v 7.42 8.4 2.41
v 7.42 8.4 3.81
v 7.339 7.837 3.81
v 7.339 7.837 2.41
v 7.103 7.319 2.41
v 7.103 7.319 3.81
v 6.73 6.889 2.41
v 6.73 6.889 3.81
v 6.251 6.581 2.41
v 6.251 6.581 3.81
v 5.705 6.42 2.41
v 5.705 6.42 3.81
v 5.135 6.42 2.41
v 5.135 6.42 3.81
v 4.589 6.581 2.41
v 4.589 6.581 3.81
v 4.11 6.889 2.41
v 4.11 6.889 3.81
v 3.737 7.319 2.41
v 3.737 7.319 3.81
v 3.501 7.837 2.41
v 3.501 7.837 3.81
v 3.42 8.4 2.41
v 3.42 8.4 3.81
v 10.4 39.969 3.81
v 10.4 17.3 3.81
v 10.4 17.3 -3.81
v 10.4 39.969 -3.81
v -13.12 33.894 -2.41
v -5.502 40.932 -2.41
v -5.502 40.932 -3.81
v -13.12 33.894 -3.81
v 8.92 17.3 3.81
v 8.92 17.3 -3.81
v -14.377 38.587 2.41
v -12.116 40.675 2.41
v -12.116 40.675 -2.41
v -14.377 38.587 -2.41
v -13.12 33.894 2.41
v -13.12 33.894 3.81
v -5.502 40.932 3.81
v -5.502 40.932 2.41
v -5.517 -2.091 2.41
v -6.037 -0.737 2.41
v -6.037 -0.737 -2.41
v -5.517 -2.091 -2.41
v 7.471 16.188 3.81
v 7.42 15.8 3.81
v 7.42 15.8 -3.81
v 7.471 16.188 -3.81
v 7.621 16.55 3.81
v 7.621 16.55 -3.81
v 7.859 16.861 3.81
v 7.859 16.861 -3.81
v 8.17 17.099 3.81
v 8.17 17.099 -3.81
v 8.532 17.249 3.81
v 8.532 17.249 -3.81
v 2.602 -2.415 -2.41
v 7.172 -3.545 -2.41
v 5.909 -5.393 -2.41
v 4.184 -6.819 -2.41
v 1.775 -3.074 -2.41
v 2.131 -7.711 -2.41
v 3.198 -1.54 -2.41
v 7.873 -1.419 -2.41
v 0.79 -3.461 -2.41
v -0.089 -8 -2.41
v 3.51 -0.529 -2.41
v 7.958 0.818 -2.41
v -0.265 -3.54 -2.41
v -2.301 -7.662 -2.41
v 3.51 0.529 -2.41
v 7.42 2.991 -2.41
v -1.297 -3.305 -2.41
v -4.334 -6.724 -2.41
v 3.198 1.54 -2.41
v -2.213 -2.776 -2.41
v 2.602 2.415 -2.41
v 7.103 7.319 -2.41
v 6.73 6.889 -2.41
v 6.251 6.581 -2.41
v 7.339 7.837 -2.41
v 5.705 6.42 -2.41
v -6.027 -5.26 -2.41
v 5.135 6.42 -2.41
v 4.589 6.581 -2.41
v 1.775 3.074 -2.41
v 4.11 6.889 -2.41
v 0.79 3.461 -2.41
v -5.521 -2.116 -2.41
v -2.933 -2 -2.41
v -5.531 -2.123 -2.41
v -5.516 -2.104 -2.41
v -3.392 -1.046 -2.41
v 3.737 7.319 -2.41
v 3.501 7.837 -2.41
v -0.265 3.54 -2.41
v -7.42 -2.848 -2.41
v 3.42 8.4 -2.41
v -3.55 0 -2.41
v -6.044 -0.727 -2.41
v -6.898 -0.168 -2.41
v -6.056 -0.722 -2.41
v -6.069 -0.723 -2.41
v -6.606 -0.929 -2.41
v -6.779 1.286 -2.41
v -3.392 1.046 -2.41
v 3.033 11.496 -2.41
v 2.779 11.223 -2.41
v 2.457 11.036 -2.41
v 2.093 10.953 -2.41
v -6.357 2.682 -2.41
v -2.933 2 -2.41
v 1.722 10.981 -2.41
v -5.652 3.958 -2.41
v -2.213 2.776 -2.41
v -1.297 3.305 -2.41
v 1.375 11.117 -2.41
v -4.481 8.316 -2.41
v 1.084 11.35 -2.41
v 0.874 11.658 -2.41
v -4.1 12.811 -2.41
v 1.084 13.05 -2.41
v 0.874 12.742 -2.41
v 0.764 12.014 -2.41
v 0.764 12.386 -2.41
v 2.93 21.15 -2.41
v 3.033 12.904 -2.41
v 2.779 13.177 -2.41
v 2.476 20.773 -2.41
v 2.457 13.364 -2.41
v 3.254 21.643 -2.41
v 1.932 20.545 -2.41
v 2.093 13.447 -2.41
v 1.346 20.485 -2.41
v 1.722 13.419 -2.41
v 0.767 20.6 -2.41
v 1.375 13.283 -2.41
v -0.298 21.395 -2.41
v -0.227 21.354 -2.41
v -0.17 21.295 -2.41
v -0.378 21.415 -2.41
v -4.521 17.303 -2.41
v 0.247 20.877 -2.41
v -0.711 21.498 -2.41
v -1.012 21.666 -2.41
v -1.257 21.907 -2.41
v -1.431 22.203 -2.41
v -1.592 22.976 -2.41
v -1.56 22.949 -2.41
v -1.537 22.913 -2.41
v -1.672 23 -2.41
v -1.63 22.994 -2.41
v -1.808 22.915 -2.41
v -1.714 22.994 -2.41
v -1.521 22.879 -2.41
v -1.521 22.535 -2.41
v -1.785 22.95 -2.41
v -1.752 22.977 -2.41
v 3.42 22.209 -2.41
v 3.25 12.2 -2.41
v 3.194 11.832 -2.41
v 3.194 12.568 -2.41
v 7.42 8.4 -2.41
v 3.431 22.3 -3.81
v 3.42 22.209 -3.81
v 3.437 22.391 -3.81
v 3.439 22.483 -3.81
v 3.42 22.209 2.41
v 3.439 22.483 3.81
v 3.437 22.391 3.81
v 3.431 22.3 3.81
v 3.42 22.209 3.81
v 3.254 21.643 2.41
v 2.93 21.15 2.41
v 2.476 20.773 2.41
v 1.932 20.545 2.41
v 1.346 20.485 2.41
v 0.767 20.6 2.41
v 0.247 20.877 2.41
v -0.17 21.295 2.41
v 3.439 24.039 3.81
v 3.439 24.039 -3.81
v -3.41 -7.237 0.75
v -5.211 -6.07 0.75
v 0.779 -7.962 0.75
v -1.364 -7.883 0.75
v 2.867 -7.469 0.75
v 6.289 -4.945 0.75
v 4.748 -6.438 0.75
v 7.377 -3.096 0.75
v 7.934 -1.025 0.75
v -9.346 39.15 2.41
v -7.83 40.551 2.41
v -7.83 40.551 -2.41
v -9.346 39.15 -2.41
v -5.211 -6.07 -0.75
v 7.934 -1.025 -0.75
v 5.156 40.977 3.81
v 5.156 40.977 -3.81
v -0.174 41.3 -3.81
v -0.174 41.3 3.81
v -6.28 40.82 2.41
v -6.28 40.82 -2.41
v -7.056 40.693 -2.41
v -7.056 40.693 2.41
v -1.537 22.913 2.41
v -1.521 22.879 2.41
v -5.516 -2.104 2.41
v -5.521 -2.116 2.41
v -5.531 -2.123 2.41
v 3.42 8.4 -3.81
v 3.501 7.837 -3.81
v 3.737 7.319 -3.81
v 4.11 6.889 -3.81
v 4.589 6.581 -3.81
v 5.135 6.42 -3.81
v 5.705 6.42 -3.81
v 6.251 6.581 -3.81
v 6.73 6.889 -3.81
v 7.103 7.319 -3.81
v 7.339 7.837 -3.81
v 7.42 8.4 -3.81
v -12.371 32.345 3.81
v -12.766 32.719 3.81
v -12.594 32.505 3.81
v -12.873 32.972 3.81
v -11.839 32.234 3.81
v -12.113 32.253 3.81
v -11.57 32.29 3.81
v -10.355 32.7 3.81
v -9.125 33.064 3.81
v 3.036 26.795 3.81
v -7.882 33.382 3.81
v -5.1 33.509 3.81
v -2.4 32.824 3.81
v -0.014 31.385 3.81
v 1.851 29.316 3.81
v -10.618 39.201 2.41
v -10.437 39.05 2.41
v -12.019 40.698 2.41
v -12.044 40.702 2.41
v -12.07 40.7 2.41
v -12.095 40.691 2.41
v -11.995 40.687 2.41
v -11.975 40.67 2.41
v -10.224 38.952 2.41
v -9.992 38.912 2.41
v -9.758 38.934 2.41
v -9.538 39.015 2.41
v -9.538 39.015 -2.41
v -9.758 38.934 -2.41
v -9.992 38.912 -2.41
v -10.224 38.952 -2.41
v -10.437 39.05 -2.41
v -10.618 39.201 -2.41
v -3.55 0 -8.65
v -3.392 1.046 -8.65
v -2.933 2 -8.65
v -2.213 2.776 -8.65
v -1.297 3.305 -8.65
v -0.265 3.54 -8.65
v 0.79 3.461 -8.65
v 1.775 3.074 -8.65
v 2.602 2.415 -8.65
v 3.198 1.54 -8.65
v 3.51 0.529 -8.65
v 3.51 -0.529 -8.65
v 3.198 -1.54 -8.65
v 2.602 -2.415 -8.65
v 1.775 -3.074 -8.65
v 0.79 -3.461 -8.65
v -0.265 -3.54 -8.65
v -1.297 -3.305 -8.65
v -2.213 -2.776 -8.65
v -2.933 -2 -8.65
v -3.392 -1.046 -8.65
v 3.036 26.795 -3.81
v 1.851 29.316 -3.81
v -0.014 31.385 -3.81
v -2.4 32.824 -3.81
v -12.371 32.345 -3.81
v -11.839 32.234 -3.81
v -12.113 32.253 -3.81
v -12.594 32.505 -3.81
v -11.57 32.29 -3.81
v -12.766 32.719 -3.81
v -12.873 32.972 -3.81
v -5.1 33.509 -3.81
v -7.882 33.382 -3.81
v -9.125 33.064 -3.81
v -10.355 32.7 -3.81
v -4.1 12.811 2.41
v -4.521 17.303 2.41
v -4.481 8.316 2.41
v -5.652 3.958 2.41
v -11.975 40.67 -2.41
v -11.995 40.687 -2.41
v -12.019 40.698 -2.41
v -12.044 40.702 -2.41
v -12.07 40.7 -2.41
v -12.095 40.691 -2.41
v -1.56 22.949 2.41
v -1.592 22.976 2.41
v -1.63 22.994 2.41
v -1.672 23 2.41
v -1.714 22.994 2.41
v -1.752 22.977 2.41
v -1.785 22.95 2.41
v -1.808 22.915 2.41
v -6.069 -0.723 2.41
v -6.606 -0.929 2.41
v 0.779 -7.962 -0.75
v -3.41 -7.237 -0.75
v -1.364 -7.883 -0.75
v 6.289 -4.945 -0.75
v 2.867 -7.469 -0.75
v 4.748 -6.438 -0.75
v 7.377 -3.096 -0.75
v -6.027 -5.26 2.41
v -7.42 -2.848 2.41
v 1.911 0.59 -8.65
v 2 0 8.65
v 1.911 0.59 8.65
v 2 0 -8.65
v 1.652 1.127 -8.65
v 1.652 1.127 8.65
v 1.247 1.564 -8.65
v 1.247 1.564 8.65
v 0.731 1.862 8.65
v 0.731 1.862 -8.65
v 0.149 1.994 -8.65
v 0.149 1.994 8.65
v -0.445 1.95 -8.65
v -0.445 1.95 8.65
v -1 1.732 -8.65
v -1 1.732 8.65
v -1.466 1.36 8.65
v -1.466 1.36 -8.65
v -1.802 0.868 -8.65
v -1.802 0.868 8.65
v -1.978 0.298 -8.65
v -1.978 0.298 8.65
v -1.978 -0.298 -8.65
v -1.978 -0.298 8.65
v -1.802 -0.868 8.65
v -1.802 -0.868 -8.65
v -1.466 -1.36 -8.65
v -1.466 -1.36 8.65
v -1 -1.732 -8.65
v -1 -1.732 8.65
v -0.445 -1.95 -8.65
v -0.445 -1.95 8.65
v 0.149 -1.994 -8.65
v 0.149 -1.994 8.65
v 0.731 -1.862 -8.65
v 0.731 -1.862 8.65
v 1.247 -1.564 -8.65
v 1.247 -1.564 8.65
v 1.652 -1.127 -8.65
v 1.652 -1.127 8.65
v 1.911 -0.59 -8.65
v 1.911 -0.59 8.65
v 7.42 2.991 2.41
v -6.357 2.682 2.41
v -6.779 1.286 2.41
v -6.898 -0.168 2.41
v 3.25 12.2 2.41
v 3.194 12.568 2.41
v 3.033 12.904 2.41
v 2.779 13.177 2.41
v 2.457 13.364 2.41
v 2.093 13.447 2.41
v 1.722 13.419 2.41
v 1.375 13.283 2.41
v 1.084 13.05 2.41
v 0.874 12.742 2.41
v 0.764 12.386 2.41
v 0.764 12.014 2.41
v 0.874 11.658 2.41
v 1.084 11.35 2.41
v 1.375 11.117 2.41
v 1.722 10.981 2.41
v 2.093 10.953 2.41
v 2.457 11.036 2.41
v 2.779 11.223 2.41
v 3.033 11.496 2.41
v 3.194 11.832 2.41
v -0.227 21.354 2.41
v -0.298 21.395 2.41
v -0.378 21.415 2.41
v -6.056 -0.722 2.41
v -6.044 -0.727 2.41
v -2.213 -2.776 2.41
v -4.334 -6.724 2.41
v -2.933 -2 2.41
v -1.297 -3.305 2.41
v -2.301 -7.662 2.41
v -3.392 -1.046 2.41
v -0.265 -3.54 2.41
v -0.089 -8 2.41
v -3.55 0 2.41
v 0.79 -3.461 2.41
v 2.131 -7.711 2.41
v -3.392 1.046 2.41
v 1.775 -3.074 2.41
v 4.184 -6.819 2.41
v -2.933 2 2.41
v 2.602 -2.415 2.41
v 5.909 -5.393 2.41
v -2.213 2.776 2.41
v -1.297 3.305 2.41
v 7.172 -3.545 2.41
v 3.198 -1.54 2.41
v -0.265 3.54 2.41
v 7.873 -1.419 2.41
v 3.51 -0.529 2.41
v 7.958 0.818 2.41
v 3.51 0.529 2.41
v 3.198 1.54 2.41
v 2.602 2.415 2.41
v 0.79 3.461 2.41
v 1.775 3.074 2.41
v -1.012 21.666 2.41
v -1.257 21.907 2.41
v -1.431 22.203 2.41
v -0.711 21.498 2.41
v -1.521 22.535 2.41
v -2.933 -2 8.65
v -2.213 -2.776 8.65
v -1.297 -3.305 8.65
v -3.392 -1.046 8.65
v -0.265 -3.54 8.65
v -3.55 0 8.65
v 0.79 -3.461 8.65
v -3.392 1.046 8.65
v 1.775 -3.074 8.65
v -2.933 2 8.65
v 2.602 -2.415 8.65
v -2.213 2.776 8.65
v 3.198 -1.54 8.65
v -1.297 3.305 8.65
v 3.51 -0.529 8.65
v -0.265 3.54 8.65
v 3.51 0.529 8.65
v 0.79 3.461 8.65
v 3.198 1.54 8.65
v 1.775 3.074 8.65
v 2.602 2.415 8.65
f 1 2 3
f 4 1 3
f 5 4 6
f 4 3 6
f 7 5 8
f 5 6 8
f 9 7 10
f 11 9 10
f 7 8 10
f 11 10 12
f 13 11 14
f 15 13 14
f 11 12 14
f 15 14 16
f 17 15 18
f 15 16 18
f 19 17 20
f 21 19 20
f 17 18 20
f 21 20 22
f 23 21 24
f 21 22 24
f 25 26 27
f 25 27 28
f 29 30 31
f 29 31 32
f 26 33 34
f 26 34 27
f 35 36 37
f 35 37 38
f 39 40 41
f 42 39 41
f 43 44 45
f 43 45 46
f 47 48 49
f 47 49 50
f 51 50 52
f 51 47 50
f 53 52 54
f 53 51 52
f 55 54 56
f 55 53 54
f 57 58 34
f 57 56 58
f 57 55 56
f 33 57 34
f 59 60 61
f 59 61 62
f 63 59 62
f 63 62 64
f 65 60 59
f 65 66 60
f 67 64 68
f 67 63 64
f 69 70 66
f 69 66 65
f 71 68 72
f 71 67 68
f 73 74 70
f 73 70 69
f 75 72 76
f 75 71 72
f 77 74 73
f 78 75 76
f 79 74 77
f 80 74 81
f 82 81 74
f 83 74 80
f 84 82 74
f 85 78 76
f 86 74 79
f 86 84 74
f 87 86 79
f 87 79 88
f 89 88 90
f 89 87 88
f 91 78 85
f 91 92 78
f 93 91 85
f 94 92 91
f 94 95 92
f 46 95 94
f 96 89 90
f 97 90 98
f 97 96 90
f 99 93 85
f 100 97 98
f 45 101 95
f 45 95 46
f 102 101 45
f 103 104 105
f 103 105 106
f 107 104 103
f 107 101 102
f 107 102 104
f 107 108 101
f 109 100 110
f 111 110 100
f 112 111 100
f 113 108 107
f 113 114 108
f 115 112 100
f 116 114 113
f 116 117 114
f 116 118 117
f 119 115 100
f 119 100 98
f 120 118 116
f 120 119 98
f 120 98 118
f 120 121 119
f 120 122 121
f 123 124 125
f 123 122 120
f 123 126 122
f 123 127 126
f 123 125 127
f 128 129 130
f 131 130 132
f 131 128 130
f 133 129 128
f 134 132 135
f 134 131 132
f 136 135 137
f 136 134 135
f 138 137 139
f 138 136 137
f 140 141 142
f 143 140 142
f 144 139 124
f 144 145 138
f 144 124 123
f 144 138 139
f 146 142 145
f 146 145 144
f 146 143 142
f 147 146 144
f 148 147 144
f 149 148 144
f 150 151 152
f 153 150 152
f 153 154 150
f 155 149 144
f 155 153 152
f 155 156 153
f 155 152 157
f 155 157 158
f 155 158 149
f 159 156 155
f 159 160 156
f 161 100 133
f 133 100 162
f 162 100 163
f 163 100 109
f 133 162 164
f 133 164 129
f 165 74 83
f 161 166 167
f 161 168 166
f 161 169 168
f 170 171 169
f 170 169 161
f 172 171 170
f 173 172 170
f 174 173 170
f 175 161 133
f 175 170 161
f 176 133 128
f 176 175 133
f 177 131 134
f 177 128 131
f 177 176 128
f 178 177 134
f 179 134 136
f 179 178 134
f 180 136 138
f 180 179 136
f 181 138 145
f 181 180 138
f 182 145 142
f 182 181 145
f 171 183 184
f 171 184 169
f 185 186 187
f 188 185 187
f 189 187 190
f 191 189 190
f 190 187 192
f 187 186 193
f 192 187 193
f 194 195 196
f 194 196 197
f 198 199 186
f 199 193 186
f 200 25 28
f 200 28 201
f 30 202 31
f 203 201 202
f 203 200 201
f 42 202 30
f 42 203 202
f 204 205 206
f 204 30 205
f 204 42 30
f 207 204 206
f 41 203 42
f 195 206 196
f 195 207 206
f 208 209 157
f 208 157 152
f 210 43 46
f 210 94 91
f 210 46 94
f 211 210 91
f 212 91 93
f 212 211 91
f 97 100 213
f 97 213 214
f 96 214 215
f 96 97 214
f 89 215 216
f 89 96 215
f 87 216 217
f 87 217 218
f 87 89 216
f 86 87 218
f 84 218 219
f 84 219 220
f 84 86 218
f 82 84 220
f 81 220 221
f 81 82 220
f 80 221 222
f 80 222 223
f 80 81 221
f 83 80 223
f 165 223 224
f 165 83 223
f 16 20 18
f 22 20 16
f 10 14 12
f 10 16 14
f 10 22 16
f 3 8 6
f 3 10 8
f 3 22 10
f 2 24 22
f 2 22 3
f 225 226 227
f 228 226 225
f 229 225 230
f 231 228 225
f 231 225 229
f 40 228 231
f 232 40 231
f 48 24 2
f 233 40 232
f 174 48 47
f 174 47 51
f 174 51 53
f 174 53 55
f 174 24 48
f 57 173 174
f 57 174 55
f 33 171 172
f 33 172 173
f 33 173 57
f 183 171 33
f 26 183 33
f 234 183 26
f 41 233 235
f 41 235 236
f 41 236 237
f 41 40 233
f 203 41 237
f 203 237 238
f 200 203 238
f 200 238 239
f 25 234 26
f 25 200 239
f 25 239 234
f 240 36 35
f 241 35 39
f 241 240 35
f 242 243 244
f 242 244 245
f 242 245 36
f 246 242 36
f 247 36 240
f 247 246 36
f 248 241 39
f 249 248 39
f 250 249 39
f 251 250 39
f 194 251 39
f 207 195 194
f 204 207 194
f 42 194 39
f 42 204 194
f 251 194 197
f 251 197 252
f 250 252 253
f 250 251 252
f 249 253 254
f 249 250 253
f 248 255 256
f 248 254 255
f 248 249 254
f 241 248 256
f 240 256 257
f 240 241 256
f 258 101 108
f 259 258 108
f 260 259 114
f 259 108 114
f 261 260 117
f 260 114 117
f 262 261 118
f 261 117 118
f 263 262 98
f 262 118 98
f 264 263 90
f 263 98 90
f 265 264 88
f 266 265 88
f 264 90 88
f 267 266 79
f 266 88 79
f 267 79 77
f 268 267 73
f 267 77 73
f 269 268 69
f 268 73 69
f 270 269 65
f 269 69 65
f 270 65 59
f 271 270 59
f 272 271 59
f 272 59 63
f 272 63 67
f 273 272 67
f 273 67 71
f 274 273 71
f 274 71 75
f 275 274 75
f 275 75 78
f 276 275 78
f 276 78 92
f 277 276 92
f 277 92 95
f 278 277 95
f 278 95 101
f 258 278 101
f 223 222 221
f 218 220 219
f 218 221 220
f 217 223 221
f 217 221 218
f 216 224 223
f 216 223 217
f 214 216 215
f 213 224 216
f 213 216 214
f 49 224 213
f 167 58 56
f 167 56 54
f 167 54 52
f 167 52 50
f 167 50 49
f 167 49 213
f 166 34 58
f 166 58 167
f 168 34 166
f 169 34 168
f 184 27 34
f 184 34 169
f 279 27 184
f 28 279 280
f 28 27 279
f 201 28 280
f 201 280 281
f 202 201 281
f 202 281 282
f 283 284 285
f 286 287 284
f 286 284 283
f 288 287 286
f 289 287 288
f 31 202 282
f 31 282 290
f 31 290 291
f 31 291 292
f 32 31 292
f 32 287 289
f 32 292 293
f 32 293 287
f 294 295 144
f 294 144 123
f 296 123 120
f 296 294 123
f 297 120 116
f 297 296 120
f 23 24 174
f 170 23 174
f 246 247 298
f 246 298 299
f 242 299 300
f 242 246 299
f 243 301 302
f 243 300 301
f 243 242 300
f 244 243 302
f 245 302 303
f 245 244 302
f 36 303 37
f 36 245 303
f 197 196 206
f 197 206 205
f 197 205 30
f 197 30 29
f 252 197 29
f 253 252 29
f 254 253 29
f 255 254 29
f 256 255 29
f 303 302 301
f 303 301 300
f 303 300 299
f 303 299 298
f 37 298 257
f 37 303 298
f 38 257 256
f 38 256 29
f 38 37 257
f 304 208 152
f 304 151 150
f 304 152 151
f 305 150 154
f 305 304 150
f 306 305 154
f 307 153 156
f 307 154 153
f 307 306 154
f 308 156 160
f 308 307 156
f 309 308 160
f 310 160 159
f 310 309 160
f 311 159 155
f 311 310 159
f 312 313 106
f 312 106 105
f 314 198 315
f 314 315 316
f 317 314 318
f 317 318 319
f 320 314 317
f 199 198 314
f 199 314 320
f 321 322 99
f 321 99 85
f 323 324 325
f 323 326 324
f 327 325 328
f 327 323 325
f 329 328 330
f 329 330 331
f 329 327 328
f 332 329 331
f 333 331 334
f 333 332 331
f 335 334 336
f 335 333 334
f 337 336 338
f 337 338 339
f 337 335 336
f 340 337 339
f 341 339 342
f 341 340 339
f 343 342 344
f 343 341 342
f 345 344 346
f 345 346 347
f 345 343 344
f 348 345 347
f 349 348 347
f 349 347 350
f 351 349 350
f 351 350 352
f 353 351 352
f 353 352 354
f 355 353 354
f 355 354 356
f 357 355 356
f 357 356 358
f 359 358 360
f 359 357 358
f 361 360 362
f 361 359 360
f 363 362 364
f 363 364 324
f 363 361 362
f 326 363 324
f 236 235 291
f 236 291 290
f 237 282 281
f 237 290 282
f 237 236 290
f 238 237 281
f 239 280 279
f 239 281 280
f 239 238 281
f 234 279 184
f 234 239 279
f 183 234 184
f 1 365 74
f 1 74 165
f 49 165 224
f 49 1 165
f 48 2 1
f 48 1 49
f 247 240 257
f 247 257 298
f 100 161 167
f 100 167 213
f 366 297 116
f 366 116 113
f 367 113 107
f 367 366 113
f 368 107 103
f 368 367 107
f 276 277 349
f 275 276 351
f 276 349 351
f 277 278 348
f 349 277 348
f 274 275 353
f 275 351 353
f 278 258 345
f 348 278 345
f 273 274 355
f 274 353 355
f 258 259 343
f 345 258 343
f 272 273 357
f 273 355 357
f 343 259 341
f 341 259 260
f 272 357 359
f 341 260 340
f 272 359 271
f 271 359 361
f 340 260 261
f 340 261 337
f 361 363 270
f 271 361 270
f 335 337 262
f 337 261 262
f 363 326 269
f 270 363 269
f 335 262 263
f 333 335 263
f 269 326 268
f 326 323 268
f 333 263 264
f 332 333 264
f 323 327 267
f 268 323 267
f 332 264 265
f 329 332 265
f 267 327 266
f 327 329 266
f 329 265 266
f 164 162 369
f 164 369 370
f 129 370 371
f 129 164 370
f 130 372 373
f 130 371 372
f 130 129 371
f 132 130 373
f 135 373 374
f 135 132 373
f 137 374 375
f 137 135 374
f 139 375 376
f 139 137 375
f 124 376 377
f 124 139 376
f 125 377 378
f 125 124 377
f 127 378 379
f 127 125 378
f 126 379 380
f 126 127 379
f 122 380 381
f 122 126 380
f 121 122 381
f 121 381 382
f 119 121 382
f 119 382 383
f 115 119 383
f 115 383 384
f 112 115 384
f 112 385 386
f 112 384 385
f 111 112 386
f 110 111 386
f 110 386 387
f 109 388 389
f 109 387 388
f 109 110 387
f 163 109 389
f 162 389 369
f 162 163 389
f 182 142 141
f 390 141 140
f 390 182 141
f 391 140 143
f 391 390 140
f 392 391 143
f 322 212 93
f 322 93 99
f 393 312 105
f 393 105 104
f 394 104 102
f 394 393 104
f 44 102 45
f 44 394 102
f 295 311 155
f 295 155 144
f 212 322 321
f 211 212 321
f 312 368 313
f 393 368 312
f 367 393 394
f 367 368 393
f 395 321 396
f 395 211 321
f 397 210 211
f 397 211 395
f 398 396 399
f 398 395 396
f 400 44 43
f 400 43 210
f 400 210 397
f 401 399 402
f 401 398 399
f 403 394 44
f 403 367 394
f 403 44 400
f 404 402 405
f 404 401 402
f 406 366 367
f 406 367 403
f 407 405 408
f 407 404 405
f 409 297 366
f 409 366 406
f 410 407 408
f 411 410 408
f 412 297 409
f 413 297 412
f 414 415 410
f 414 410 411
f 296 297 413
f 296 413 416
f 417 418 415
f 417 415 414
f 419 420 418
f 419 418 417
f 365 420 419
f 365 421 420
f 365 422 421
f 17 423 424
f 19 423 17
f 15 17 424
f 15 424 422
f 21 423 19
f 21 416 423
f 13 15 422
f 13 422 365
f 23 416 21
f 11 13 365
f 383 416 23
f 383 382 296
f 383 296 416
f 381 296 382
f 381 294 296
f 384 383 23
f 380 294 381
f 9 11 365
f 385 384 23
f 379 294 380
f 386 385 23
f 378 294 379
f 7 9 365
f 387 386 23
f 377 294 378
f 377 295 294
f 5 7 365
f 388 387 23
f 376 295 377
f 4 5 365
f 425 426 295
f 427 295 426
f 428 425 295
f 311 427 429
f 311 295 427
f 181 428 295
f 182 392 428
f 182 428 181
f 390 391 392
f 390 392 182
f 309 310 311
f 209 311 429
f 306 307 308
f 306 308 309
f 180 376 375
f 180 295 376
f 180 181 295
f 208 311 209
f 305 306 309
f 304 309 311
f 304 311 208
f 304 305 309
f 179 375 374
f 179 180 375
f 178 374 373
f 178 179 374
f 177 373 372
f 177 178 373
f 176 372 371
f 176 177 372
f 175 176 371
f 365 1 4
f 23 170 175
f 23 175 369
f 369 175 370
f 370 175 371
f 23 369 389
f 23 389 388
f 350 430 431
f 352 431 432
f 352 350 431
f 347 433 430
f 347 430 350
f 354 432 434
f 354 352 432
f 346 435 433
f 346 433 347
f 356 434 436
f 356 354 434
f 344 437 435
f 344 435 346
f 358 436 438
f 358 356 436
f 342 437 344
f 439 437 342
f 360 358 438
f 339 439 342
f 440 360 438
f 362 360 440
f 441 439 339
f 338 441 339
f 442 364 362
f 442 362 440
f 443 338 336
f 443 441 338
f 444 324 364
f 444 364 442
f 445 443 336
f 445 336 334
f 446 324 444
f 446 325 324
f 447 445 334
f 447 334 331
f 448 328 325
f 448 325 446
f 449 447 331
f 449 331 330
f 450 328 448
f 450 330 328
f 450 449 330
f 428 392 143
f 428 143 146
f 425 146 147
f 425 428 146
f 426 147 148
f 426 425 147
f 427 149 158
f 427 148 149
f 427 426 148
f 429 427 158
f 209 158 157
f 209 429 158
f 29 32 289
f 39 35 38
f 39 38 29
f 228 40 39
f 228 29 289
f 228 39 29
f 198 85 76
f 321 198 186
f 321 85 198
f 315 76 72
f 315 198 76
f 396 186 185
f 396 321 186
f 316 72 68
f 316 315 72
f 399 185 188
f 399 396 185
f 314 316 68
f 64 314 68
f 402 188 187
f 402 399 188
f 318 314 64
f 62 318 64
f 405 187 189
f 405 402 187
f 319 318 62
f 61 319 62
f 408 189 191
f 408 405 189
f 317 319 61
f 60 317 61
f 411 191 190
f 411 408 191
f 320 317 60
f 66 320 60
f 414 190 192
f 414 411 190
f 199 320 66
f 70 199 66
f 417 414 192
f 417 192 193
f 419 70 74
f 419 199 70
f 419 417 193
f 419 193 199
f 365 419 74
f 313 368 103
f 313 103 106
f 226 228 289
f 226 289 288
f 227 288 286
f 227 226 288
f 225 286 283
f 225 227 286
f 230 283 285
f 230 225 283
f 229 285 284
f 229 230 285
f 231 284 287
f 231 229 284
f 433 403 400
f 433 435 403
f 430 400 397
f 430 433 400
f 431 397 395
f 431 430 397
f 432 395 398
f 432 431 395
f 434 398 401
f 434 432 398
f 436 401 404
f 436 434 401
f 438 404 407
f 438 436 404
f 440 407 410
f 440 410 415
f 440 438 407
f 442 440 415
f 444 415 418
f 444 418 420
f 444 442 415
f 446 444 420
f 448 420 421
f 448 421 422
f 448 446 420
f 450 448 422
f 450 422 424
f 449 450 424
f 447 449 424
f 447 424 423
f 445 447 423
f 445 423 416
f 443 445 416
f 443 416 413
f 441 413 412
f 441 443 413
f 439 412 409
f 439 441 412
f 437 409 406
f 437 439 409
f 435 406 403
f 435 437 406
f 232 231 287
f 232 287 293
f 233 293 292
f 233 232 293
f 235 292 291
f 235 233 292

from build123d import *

# Parameters (mm, degrees)
SKETCH1_R               = 2
BOSS_EXTRUDE2_DEPTH     = 8.65
CUT_EXTRUDE3_START      = -4.84
SKETCH21_R              = 3.55
CUT_EXTRUDE3_DEPTH      = 4.84
SKETCH18_R              = 3.55
CUT_EXTRUDE4_DEPTH      = 4.84
SKETCH27_R              = 3.55
CUT_EXTRUDE7_DEPTH      = 1.4
CUT_EXTRUDE8_START      = -1.4
SKETCH29_R              = 3.55
CUT_EXTRUDE8_DEPTH      = 1.4
CUT_EXTRUDE9_DEPTH      = 45.578250281
CUT_EXTRUDE9_DEPTH_BACK = 45.578250281
SKETCH6_R               = 1.25
CUT_EXTRUDE10_DEPTH     = 0.75


with BuildPart() as part:
    # Sketch1 → Boss-Extrude2 (new, symmetric)
    with BuildSketch(Plane.XY):
        with BuildLine():
            ThreePointArc((-5.651629818, 3.958418927), (-6.605289058, 1.995032948), (-6.897954559, -0.167996721))
            Line((-6.897954559, -0.167996721), (-6.605824697, -0.929021032))
            Line((-6.605824697, -0.929021032), (-6.069015951, -0.722959461))
            ThreePointArc((-6.069015951, -0.722959461), (-6.049888336, -0.723460336), (-6.036717242, -0.737339773))
            Line((-6.036717242, -0.737339773), (-5.517083715, -2.091031392))
            ThreePointArc((-5.517083715, -2.091031392), (-5.517584589, -2.110159006), (-5.531464027, -2.123330101))
            Line((-5.531464027, -2.123330101), (-7.419958348, -2.848255151))
            Line((-7.419958348, -2.848255151), (-6.027342222, -5.260337036))
            ThreePointArc((-6.027342222, -5.260337036), (4.183814464, -6.818775296), (7.42, 2.990585227))
            Line((7.42, 2.990585227), (7.42, 9.395292614))
            Line((7.42, 9.395292614), (7.42, 15.8))
            ThreePointArc((7.42, 15.8), (7.859339828, 16.860660172), (8.92, 17.3))
            Line((8.92, 17.3), (10.4, 17.3))
            Line((10.4, 17.3), (10.4, 39.969113075))
            ThreePointArc((10.4, 39.969113075), (1.317615366, 41.278976365), (-7.82981649, 40.551004596))
            Line((-7.82981649, 40.551004596), (-9.346087248, 39.150359553))
            ThreePointArc((-9.346087248, 39.150359553), (-9.992424937, 38.912169279), (-10.617880658, 39.200773083))
            Line((-10.617880658, 39.200773083), (-11.974969412, 40.669891905))
            ThreePointArc((-11.974969412, 40.669891905), (-12.044464492, 40.701958995), (-12.116279791, 40.675493408))
            Line((-12.116279791, 40.675493408), (-14.377339743, 38.586854295))
            Line((-14.377339743, 38.586854295), (-12.872946932, 32.972383888))
            ThreePointArc((-12.872946932, 32.972383888), (-12.370989585, 32.345351225), (-11.569711725, 32.289809083))
            ThreePointArc((-11.569711725, 32.289809083), (-9.741406245, 32.887611716), (-7.882463977, 33.38198259))
            ThreePointArc((-7.882463977, 33.38198259), (-0.014271933, 31.38535878), (3.438957848, 24.038920408))
            Line((3.438957848, 24.038920408), (3.438957848, 22.483224896))
            ThreePointArc((3.438957848, 22.483224896), (2.06450625, 20.583569875), (-0.169731349, 21.294898734))
            ThreePointArc((-0.169731349, 21.294898734), (-0.261150212, 21.376524071), (-0.377583309, 21.41477898))
            ThreePointArc((-0.377583309, 21.41477898), (-1.257242701, 21.906570189), (-1.521126803, 22.879208054))
            Line((-1.521126803, 22.879208054), (-1.537067384, 22.913392739))
            ThreePointArc((-1.537067384, 22.913392739), (-1.671971186, 22.999996378), (-1.808065565, 22.91527598))
            Line((-1.808065565, 22.91527598), (-4.520599254, 17.303209571))
            ThreePointArc((-4.520599254, 17.303209571), (-4.190739584, 10.554927226), (-5.651629818, 3.958418927))
        make_face()
        Circle(SKETCH1_R, mode=Mode.SUBTRACT)
    extrude(amount=BOSS_EXTRUDE2_DEPTH, both=True)

    # Sketch21 → Cut-Extrude3 (cut)
    with BuildSketch(Plane(origin=(0, 0, -8.65), x_dir=(-1, 0, 0), z_dir=(0, 0, -1)).offset(CUT_EXTRUDE3_START)):
        with BuildLine():
            Line((12.872946932, 32.972383888), (14.377339743, 38.586854295))
            Line((14.377339743, 38.586854295), (12.116279791, 40.675493408))
            ThreePointArc((12.116279791, 40.675493408), (12.044464492, 40.701958995), (11.974969412, 40.669891905))
            Line((11.974969412, 40.669891905), (10.617880658, 39.200773083))
            ThreePointArc((10.617880658, 39.200773083), (9.992424937, 38.912169279), (9.346087248, 39.150359553))
            Line((9.346087248, 39.150359553), (7.82981649, 40.551004596))
            ThreePointArc((7.82981649, 40.551004596), (-1.317615366, 41.278976365), (-10.4, 39.969113075))
            Line((-10.4, 39.969113075), (-10.4, 17.3))
            Line((-10.4, 17.3), (-8.92, 17.3))
            ThreePointArc((-8.92, 17.3), (-7.859339828, 16.860660172), (-7.42, 15.8))
            Line((-7.42, 15.8), (-7.42, 9.395292614))
            Line((-7.42, 9.395292614), (-7.42, 2.990585227))
            ThreePointArc((-7.42, 2.990585227), (-4.183814464, -6.818775296), (6.027342222, -5.260337036))
            Line((6.027342222, -5.260337036), (7.419958348, -2.848255151))
            Line((7.419958348, -2.848255151), (5.531464027, -2.123330101))
            ThreePointArc((5.531464027, -2.123330101), (5.517584589, -2.110159006), (5.517083715, -2.091031392))
            Line((5.517083715, -2.091031392), (6.036717242, -0.737339773))
            ThreePointArc((6.036717242, -0.737339773), (6.049888336, -0.723460336), (6.069015951, -0.722959461))
            Line((6.069015951, -0.722959461), (6.605824697, -0.929021032))
            Line((6.605824697, -0.929021032), (6.897954559, -0.167996721))
            ThreePointArc((6.897954559, -0.167996721), (6.605289058, 1.995032948), (5.651629818, 3.958418927))
            ThreePointArc((5.651629818, 3.958418927), (4.190739584, 10.554927226), (4.520599254, 17.303209571))
            Line((4.520599254, 17.303209571), (1.808065565, 22.91527598))
            ThreePointArc((1.808065565, 22.91527598), (1.671971186, 22.999996378), (1.537067384, 22.913392739))
            Line((1.537067384, 22.913392739), (1.521126803, 22.879208054))
            ThreePointArc((1.521126803, 22.879208054), (1.257242701, 21.906570189), (0.377583309, 21.41477898))
            ThreePointArc((0.377583309, 21.41477898), (0.261150212, 21.376524071), (0.169731349, 21.294898734))
            ThreePointArc((0.169731349, 21.294898734), (-2.06450625, 20.583569875), (-3.438957848, 22.483224896))
            Line((-3.438957848, 22.483224896), (-3.438957848, 24.038920408))
            ThreePointArc((-3.438957848, 24.038920408), (0.014271933, 31.38535878), (7.882463977, 33.38198259))
            ThreePointArc((7.882463977, 33.38198259), (9.741406245, 32.887611716), (11.569711725, 32.289809083))
            ThreePointArc((11.569711725, 32.289809083), (12.370989585, 32.345351225), (12.872946932, 32.972383888))
        make_face()
        Circle(SKETCH21_R, mode=Mode.SUBTRACT)
    extrude(amount=CUT_EXTRUDE3_DEPTH, mode=Mode.SUBTRACT)

    # Sketch18 → Cut-Extrude4 (cut)
    with BuildSketch(Plane.XY.offset(8.65)):
        with BuildLine():
            ThreePointArc((-5.651629818, 3.958418927), (-6.605289058, 1.995032948), (-6.897954559, -0.167996721))
            Line((-6.897954559, -0.167996721), (-6.605824697, -0.929021032))
            Line((-6.605824697, -0.929021032), (-6.069015951, -0.722959461))
            ThreePointArc((-6.069015951, -0.722959461), (-6.049888336, -0.723460336), (-6.036717242, -0.737339773))
            Line((-6.036717242, -0.737339773), (-5.517083715, -2.091031392))
            ThreePointArc((-5.517083715, -2.091031392), (-5.517584589, -2.110159006), (-5.531464027, -2.123330101))
            Line((-5.531464027, -2.123330101), (-7.419958348, -2.848255151))
            Line((-7.419958348, -2.848255151), (-6.027342222, -5.260337036))
            ThreePointArc((-6.027342222, -5.260337036), (4.183814464, -6.818775296), (7.42, 2.990585227))
            Line((7.42, 2.990585227), (7.42, 9.395292614))
            Line((7.42, 9.395292614), (7.42, 15.8))
            ThreePointArc((7.42, 15.8), (7.859339828, 16.860660172), (8.92, 17.3))
            Line((8.92, 17.3), (10.4, 17.3))
            Line((10.4, 17.3), (10.4, 39.969113075))
            ThreePointArc((10.4, 39.969113075), (1.317615366, 41.278976365), (-7.82981649, 40.551004596))
            Line((-7.82981649, 40.551004596), (-9.346087248, 39.150359553))
            ThreePointArc((-9.346087248, 39.150359553), (-9.992424937, 38.912169279), (-10.617880658, 39.200773083))
            Line((-10.617880658, 39.200773083), (-11.974969412, 40.669891905))
            ThreePointArc((-11.974969412, 40.669891905), (-12.044464492, 40.701958995), (-12.116279791, 40.675493408))
            Line((-12.116279791, 40.675493408), (-14.377339743, 38.586854295))
            Line((-14.377339743, 38.586854295), (-12.872946932, 32.972383888))
            ThreePointArc((-12.872946932, 32.972383888), (-12.370989585, 32.345351225), (-11.569711725, 32.289809083))
            ThreePointArc((-11.569711725, 32.289809083), (-9.741406245, 32.887611716), (-7.882463977, 33.38198259))
            ThreePointArc((-7.882463977, 33.38198259), (-0.014271933, 31.38535878), (3.438957848, 24.038920408))
            Line((3.438957848, 24.038920408), (3.438957848, 22.483224896))
            ThreePointArc((3.438957848, 22.483224896), (2.06450625, 20.583569875), (-0.169731349, 21.294898734))
            ThreePointArc((-0.169731349, 21.294898734), (-0.261150212, 21.376524071), (-0.377583309, 21.41477898))
            ThreePointArc((-0.377583309, 21.41477898), (-1.257242701, 21.906570189), (-1.521126803, 22.879208054))
            Line((-1.521126803, 22.879208054), (-1.537067384, 22.913392739))
            ThreePointArc((-1.537067384, 22.913392739), (-1.671971186, 22.999996378), (-1.808065565, 22.91527598))
            Line((-1.808065565, 22.91527598), (-4.520599254, 17.303209571))
            ThreePointArc((-4.520599254, 17.303209571), (-4.190739584, 10.554927226), (-5.651629818, 3.958418927))
        make_face()
        with Locations(Location((0, 0, 0), (0, 0, 180))):
            Circle(SKETCH18_R, mode=Mode.SUBTRACT)
    extrude(amount=-CUT_EXTRUDE4_DEPTH, mode=Mode.SUBTRACT)

    # Sketch27 → Cut-Extrude7 (cut)
    # profile 1 of 2: a face of its own
    with BuildSketch(Plane.XY.offset(3.81)):
        with BuildLine():
            ThreePointArc((-5.651629818, 3.958418927), (-6.605289058, 1.995032948), (-6.897954559, -0.167996721))
            Line((-6.897954559, -0.167996721), (-6.605824697, -0.929021032))
            Line((-6.605824697, -0.929021032), (-6.069015951, -0.722959461))
            ThreePointArc((-6.069015951, -0.722959461), (-6.049888336, -0.723460336), (-6.036717242, -0.737339773))
            Line((-6.036717242, -0.737339773), (-5.517083715, -2.091031392))
            ThreePointArc((-5.517083715, -2.091031392), (-5.517584589, -2.110159006), (-5.531464027, -2.123330101))
            Line((-5.531464027, -2.123330101), (-7.419958348, -2.848255151))
            Line((-7.419958348, -2.848255151), (-6.027342222, -5.260337036))
            ThreePointArc((-6.027342222, -5.260337036), (4.183814464, -6.818775296), (7.42, 2.990585227))
            Line((7.42, 2.990585227), (7.42, 8.4))
            ThreePointArc((7.42, 8.4), (5.42, 6.4), (3.42, 8.4))
            Line((3.42, 8.4), (3.42, 22.208503231))
            ThreePointArc((3.42, 22.208503231), (1.932242731, 20.545011795), (-0.169731349, 21.294898734))
            ThreePointArc((-0.169731349, 21.294898734), (-0.261150212, 21.376524071), (-0.377583309, 21.41477898))
            ThreePointArc((-0.377583309, 21.41477898), (-1.257242701, 21.906570189), (-1.521126803, 22.879208054))
            Line((-1.521126803, 22.879208054), (-1.537067384, 22.913392739))
            ThreePointArc((-1.537067384, 22.913392739), (-1.671971186, 22.999996378), (-1.808065565, 22.91527598))
            Line((-1.808065565, 22.91527598), (-4.520599254, 17.303209571))
            ThreePointArc((-4.520599254, 17.303209571), (-4.190739584, 10.554927226), (-5.651629818, 3.958418927))
        make_face()
        with Locations(Location((0, 0, 0), (0, 0, 180))):
            Circle(SKETCH27_R, mode=Mode.SUBTRACT)
    # profile 2 of 2: a face of its own
    with BuildSketch(Plane.XY.offset(3.81)):
        with BuildLine():
            Line((-13.120014147, 33.89445129), (-5.501583304, 40.931926184))
            ThreePointArc((-5.501583304, 40.931926184), (-6.668420385, 40.758093301), (-7.82981649, 40.551004596))
            Line((-7.82981649, 40.551004596), (-9.346087248, 39.150359553))
            ThreePointArc((-9.346087248, 39.150359553), (-9.992424937, 38.912169279), (-10.617880658, 39.200773083))
            Line((-10.617880658, 39.200773083), (-11.974969412, 40.669891905))
            ThreePointArc((-11.974969412, 40.669891905), (-12.044464492, 40.701958995), (-12.116279791, 40.675493408))
            Line((-12.116279791, 40.675493408), (-14.377339743, 38.586854295))
            Line((-14.377339743, 38.586854295), (-13.120014147, 33.89445129))
        make_face()
    extrude(amount=-CUT_EXTRUDE7_DEPTH, mode=Mode.SUBTRACT)

    # Sketch29 → Cut-Extrude8 (cut)
    # profile 1 of 2: a face of its own
    with BuildSketch(Plane(origin=(0, 0, -3.81), x_dir=(-1, 0, 0), z_dir=(0, 0, -1)).offset(CUT_EXTRUDE8_START)):
        with BuildLine():
            Line((13.120014147, 33.89445129), (14.377339743, 38.586854295))
            Line((14.377339743, 38.586854295), (12.116279791, 40.675493408))
            ThreePointArc((12.116279791, 40.675493408), (12.044464492, 40.701958995), (11.974969412, 40.669891905))
            Line((11.974969412, 40.669891905), (10.617880658, 39.200773083))
            ThreePointArc((10.617880658, 39.200773083), (9.992424937, 38.912169279), (9.346087248, 39.150359553))
            Line((9.346087248, 39.150359553), (7.82981649, 40.551004596))
            ThreePointArc((7.82981649, 40.551004596), (6.668420385, 40.758093301), (5.501583304, 40.931926184))
            Line((5.501583304, 40.931926184), (13.120014147, 33.89445129))
        make_face()
    # profile 2 of 2: a face of its own
    with BuildSketch(Plane(origin=(0, 0, -3.81), x_dir=(-1, 0, 0), z_dir=(0, 0, -1)).offset(CUT_EXTRUDE8_START)):
        with BuildLine():
            ThreePointArc((0.169731349, 21.294898734), (-1.932242731, 20.545011795), (-3.42, 22.208503231))
            Line((-3.42, 22.208503231), (-3.42, 8.4))
            ThreePointArc((-3.42, 8.4), (-5.42, 6.4), (-7.42, 8.4))
            Line((-7.42, 8.4), (-7.42, 2.990585227))
            ThreePointArc((-7.42, 2.990585227), (-4.183814464, -6.818775296), (6.027342222, -5.260337036))
            Line((6.027342222, -5.260337036), (7.419958348, -2.848255151))
            Line((7.419958348, -2.848255151), (5.531464027, -2.123330101))
            ThreePointArc((5.531464027, -2.123330101), (5.517584589, -2.110159006), (5.517083715, -2.091031392))
            Line((5.517083715, -2.091031392), (6.036717242, -0.737339773))
            ThreePointArc((6.036717242, -0.737339773), (6.049888336, -0.723460336), (6.069015951, -0.722959461))
            Line((6.069015951, -0.722959461), (6.605824697, -0.929021032))
            Line((6.605824697, -0.929021032), (6.897954559, -0.167996721))
            ThreePointArc((6.897954559, -0.167996721), (6.605289058, 1.995032948), (5.651629818, 3.958418927))
            ThreePointArc((5.651629818, 3.958418927), (4.190739584, 10.554927226), (4.520599254, 17.303209571))
            Line((4.520599254, 17.303209571), (1.808065565, 22.91527598))
            ThreePointArc((1.808065565, 22.91527598), (1.671971186, 22.999996378), (1.537067384, 22.913392739))
            Line((1.537067384, 22.913392739), (1.521126803, 22.879208054))
            ThreePointArc((1.521126803, 22.879208054), (1.257242701, 21.906570189), (0.377583309, 21.41477898))
            ThreePointArc((0.377583309, 21.41477898), (0.261150212, 21.376524071), (0.169731349, 21.294898734))
        make_face()
        Circle(SKETCH29_R, mode=Mode.SUBTRACT)
    extrude(amount=CUT_EXTRUDE8_DEPTH, mode=Mode.SUBTRACT)

    # Sketch6 → Cut-Extrude9 (cut, two sides: drawn at the far end of the back side and taken through both)
    with BuildSketch(Plane.XY.offset(-CUT_EXTRUDE9_DEPTH_BACK)):
        with Locations((2, 12.2)):
            Circle(SKETCH6_R)
    extrude(amount=CUT_EXTRUDE9_DEPTH + CUT_EXTRUDE9_DEPTH_BACK, mode=Mode.SUBTRACT)

    # Sketch30 → Cut-Extrude10 (cut, symmetric)
    with BuildSketch(Plane.XY):
        with BuildLine():
            Line((7.934098321, -1.02473598), (-5.210501905, -6.070475262))
            ThreePointArc((-5.210501905, -6.070475262), (2.866943596, -7.468643412), (7.934098321, -1.02473598))
        make_face()
    extrude(amount=CUT_EXTRUDE10_DEPTH, both=True, mode=Mode.SUBTRACT)


solid = part.part
